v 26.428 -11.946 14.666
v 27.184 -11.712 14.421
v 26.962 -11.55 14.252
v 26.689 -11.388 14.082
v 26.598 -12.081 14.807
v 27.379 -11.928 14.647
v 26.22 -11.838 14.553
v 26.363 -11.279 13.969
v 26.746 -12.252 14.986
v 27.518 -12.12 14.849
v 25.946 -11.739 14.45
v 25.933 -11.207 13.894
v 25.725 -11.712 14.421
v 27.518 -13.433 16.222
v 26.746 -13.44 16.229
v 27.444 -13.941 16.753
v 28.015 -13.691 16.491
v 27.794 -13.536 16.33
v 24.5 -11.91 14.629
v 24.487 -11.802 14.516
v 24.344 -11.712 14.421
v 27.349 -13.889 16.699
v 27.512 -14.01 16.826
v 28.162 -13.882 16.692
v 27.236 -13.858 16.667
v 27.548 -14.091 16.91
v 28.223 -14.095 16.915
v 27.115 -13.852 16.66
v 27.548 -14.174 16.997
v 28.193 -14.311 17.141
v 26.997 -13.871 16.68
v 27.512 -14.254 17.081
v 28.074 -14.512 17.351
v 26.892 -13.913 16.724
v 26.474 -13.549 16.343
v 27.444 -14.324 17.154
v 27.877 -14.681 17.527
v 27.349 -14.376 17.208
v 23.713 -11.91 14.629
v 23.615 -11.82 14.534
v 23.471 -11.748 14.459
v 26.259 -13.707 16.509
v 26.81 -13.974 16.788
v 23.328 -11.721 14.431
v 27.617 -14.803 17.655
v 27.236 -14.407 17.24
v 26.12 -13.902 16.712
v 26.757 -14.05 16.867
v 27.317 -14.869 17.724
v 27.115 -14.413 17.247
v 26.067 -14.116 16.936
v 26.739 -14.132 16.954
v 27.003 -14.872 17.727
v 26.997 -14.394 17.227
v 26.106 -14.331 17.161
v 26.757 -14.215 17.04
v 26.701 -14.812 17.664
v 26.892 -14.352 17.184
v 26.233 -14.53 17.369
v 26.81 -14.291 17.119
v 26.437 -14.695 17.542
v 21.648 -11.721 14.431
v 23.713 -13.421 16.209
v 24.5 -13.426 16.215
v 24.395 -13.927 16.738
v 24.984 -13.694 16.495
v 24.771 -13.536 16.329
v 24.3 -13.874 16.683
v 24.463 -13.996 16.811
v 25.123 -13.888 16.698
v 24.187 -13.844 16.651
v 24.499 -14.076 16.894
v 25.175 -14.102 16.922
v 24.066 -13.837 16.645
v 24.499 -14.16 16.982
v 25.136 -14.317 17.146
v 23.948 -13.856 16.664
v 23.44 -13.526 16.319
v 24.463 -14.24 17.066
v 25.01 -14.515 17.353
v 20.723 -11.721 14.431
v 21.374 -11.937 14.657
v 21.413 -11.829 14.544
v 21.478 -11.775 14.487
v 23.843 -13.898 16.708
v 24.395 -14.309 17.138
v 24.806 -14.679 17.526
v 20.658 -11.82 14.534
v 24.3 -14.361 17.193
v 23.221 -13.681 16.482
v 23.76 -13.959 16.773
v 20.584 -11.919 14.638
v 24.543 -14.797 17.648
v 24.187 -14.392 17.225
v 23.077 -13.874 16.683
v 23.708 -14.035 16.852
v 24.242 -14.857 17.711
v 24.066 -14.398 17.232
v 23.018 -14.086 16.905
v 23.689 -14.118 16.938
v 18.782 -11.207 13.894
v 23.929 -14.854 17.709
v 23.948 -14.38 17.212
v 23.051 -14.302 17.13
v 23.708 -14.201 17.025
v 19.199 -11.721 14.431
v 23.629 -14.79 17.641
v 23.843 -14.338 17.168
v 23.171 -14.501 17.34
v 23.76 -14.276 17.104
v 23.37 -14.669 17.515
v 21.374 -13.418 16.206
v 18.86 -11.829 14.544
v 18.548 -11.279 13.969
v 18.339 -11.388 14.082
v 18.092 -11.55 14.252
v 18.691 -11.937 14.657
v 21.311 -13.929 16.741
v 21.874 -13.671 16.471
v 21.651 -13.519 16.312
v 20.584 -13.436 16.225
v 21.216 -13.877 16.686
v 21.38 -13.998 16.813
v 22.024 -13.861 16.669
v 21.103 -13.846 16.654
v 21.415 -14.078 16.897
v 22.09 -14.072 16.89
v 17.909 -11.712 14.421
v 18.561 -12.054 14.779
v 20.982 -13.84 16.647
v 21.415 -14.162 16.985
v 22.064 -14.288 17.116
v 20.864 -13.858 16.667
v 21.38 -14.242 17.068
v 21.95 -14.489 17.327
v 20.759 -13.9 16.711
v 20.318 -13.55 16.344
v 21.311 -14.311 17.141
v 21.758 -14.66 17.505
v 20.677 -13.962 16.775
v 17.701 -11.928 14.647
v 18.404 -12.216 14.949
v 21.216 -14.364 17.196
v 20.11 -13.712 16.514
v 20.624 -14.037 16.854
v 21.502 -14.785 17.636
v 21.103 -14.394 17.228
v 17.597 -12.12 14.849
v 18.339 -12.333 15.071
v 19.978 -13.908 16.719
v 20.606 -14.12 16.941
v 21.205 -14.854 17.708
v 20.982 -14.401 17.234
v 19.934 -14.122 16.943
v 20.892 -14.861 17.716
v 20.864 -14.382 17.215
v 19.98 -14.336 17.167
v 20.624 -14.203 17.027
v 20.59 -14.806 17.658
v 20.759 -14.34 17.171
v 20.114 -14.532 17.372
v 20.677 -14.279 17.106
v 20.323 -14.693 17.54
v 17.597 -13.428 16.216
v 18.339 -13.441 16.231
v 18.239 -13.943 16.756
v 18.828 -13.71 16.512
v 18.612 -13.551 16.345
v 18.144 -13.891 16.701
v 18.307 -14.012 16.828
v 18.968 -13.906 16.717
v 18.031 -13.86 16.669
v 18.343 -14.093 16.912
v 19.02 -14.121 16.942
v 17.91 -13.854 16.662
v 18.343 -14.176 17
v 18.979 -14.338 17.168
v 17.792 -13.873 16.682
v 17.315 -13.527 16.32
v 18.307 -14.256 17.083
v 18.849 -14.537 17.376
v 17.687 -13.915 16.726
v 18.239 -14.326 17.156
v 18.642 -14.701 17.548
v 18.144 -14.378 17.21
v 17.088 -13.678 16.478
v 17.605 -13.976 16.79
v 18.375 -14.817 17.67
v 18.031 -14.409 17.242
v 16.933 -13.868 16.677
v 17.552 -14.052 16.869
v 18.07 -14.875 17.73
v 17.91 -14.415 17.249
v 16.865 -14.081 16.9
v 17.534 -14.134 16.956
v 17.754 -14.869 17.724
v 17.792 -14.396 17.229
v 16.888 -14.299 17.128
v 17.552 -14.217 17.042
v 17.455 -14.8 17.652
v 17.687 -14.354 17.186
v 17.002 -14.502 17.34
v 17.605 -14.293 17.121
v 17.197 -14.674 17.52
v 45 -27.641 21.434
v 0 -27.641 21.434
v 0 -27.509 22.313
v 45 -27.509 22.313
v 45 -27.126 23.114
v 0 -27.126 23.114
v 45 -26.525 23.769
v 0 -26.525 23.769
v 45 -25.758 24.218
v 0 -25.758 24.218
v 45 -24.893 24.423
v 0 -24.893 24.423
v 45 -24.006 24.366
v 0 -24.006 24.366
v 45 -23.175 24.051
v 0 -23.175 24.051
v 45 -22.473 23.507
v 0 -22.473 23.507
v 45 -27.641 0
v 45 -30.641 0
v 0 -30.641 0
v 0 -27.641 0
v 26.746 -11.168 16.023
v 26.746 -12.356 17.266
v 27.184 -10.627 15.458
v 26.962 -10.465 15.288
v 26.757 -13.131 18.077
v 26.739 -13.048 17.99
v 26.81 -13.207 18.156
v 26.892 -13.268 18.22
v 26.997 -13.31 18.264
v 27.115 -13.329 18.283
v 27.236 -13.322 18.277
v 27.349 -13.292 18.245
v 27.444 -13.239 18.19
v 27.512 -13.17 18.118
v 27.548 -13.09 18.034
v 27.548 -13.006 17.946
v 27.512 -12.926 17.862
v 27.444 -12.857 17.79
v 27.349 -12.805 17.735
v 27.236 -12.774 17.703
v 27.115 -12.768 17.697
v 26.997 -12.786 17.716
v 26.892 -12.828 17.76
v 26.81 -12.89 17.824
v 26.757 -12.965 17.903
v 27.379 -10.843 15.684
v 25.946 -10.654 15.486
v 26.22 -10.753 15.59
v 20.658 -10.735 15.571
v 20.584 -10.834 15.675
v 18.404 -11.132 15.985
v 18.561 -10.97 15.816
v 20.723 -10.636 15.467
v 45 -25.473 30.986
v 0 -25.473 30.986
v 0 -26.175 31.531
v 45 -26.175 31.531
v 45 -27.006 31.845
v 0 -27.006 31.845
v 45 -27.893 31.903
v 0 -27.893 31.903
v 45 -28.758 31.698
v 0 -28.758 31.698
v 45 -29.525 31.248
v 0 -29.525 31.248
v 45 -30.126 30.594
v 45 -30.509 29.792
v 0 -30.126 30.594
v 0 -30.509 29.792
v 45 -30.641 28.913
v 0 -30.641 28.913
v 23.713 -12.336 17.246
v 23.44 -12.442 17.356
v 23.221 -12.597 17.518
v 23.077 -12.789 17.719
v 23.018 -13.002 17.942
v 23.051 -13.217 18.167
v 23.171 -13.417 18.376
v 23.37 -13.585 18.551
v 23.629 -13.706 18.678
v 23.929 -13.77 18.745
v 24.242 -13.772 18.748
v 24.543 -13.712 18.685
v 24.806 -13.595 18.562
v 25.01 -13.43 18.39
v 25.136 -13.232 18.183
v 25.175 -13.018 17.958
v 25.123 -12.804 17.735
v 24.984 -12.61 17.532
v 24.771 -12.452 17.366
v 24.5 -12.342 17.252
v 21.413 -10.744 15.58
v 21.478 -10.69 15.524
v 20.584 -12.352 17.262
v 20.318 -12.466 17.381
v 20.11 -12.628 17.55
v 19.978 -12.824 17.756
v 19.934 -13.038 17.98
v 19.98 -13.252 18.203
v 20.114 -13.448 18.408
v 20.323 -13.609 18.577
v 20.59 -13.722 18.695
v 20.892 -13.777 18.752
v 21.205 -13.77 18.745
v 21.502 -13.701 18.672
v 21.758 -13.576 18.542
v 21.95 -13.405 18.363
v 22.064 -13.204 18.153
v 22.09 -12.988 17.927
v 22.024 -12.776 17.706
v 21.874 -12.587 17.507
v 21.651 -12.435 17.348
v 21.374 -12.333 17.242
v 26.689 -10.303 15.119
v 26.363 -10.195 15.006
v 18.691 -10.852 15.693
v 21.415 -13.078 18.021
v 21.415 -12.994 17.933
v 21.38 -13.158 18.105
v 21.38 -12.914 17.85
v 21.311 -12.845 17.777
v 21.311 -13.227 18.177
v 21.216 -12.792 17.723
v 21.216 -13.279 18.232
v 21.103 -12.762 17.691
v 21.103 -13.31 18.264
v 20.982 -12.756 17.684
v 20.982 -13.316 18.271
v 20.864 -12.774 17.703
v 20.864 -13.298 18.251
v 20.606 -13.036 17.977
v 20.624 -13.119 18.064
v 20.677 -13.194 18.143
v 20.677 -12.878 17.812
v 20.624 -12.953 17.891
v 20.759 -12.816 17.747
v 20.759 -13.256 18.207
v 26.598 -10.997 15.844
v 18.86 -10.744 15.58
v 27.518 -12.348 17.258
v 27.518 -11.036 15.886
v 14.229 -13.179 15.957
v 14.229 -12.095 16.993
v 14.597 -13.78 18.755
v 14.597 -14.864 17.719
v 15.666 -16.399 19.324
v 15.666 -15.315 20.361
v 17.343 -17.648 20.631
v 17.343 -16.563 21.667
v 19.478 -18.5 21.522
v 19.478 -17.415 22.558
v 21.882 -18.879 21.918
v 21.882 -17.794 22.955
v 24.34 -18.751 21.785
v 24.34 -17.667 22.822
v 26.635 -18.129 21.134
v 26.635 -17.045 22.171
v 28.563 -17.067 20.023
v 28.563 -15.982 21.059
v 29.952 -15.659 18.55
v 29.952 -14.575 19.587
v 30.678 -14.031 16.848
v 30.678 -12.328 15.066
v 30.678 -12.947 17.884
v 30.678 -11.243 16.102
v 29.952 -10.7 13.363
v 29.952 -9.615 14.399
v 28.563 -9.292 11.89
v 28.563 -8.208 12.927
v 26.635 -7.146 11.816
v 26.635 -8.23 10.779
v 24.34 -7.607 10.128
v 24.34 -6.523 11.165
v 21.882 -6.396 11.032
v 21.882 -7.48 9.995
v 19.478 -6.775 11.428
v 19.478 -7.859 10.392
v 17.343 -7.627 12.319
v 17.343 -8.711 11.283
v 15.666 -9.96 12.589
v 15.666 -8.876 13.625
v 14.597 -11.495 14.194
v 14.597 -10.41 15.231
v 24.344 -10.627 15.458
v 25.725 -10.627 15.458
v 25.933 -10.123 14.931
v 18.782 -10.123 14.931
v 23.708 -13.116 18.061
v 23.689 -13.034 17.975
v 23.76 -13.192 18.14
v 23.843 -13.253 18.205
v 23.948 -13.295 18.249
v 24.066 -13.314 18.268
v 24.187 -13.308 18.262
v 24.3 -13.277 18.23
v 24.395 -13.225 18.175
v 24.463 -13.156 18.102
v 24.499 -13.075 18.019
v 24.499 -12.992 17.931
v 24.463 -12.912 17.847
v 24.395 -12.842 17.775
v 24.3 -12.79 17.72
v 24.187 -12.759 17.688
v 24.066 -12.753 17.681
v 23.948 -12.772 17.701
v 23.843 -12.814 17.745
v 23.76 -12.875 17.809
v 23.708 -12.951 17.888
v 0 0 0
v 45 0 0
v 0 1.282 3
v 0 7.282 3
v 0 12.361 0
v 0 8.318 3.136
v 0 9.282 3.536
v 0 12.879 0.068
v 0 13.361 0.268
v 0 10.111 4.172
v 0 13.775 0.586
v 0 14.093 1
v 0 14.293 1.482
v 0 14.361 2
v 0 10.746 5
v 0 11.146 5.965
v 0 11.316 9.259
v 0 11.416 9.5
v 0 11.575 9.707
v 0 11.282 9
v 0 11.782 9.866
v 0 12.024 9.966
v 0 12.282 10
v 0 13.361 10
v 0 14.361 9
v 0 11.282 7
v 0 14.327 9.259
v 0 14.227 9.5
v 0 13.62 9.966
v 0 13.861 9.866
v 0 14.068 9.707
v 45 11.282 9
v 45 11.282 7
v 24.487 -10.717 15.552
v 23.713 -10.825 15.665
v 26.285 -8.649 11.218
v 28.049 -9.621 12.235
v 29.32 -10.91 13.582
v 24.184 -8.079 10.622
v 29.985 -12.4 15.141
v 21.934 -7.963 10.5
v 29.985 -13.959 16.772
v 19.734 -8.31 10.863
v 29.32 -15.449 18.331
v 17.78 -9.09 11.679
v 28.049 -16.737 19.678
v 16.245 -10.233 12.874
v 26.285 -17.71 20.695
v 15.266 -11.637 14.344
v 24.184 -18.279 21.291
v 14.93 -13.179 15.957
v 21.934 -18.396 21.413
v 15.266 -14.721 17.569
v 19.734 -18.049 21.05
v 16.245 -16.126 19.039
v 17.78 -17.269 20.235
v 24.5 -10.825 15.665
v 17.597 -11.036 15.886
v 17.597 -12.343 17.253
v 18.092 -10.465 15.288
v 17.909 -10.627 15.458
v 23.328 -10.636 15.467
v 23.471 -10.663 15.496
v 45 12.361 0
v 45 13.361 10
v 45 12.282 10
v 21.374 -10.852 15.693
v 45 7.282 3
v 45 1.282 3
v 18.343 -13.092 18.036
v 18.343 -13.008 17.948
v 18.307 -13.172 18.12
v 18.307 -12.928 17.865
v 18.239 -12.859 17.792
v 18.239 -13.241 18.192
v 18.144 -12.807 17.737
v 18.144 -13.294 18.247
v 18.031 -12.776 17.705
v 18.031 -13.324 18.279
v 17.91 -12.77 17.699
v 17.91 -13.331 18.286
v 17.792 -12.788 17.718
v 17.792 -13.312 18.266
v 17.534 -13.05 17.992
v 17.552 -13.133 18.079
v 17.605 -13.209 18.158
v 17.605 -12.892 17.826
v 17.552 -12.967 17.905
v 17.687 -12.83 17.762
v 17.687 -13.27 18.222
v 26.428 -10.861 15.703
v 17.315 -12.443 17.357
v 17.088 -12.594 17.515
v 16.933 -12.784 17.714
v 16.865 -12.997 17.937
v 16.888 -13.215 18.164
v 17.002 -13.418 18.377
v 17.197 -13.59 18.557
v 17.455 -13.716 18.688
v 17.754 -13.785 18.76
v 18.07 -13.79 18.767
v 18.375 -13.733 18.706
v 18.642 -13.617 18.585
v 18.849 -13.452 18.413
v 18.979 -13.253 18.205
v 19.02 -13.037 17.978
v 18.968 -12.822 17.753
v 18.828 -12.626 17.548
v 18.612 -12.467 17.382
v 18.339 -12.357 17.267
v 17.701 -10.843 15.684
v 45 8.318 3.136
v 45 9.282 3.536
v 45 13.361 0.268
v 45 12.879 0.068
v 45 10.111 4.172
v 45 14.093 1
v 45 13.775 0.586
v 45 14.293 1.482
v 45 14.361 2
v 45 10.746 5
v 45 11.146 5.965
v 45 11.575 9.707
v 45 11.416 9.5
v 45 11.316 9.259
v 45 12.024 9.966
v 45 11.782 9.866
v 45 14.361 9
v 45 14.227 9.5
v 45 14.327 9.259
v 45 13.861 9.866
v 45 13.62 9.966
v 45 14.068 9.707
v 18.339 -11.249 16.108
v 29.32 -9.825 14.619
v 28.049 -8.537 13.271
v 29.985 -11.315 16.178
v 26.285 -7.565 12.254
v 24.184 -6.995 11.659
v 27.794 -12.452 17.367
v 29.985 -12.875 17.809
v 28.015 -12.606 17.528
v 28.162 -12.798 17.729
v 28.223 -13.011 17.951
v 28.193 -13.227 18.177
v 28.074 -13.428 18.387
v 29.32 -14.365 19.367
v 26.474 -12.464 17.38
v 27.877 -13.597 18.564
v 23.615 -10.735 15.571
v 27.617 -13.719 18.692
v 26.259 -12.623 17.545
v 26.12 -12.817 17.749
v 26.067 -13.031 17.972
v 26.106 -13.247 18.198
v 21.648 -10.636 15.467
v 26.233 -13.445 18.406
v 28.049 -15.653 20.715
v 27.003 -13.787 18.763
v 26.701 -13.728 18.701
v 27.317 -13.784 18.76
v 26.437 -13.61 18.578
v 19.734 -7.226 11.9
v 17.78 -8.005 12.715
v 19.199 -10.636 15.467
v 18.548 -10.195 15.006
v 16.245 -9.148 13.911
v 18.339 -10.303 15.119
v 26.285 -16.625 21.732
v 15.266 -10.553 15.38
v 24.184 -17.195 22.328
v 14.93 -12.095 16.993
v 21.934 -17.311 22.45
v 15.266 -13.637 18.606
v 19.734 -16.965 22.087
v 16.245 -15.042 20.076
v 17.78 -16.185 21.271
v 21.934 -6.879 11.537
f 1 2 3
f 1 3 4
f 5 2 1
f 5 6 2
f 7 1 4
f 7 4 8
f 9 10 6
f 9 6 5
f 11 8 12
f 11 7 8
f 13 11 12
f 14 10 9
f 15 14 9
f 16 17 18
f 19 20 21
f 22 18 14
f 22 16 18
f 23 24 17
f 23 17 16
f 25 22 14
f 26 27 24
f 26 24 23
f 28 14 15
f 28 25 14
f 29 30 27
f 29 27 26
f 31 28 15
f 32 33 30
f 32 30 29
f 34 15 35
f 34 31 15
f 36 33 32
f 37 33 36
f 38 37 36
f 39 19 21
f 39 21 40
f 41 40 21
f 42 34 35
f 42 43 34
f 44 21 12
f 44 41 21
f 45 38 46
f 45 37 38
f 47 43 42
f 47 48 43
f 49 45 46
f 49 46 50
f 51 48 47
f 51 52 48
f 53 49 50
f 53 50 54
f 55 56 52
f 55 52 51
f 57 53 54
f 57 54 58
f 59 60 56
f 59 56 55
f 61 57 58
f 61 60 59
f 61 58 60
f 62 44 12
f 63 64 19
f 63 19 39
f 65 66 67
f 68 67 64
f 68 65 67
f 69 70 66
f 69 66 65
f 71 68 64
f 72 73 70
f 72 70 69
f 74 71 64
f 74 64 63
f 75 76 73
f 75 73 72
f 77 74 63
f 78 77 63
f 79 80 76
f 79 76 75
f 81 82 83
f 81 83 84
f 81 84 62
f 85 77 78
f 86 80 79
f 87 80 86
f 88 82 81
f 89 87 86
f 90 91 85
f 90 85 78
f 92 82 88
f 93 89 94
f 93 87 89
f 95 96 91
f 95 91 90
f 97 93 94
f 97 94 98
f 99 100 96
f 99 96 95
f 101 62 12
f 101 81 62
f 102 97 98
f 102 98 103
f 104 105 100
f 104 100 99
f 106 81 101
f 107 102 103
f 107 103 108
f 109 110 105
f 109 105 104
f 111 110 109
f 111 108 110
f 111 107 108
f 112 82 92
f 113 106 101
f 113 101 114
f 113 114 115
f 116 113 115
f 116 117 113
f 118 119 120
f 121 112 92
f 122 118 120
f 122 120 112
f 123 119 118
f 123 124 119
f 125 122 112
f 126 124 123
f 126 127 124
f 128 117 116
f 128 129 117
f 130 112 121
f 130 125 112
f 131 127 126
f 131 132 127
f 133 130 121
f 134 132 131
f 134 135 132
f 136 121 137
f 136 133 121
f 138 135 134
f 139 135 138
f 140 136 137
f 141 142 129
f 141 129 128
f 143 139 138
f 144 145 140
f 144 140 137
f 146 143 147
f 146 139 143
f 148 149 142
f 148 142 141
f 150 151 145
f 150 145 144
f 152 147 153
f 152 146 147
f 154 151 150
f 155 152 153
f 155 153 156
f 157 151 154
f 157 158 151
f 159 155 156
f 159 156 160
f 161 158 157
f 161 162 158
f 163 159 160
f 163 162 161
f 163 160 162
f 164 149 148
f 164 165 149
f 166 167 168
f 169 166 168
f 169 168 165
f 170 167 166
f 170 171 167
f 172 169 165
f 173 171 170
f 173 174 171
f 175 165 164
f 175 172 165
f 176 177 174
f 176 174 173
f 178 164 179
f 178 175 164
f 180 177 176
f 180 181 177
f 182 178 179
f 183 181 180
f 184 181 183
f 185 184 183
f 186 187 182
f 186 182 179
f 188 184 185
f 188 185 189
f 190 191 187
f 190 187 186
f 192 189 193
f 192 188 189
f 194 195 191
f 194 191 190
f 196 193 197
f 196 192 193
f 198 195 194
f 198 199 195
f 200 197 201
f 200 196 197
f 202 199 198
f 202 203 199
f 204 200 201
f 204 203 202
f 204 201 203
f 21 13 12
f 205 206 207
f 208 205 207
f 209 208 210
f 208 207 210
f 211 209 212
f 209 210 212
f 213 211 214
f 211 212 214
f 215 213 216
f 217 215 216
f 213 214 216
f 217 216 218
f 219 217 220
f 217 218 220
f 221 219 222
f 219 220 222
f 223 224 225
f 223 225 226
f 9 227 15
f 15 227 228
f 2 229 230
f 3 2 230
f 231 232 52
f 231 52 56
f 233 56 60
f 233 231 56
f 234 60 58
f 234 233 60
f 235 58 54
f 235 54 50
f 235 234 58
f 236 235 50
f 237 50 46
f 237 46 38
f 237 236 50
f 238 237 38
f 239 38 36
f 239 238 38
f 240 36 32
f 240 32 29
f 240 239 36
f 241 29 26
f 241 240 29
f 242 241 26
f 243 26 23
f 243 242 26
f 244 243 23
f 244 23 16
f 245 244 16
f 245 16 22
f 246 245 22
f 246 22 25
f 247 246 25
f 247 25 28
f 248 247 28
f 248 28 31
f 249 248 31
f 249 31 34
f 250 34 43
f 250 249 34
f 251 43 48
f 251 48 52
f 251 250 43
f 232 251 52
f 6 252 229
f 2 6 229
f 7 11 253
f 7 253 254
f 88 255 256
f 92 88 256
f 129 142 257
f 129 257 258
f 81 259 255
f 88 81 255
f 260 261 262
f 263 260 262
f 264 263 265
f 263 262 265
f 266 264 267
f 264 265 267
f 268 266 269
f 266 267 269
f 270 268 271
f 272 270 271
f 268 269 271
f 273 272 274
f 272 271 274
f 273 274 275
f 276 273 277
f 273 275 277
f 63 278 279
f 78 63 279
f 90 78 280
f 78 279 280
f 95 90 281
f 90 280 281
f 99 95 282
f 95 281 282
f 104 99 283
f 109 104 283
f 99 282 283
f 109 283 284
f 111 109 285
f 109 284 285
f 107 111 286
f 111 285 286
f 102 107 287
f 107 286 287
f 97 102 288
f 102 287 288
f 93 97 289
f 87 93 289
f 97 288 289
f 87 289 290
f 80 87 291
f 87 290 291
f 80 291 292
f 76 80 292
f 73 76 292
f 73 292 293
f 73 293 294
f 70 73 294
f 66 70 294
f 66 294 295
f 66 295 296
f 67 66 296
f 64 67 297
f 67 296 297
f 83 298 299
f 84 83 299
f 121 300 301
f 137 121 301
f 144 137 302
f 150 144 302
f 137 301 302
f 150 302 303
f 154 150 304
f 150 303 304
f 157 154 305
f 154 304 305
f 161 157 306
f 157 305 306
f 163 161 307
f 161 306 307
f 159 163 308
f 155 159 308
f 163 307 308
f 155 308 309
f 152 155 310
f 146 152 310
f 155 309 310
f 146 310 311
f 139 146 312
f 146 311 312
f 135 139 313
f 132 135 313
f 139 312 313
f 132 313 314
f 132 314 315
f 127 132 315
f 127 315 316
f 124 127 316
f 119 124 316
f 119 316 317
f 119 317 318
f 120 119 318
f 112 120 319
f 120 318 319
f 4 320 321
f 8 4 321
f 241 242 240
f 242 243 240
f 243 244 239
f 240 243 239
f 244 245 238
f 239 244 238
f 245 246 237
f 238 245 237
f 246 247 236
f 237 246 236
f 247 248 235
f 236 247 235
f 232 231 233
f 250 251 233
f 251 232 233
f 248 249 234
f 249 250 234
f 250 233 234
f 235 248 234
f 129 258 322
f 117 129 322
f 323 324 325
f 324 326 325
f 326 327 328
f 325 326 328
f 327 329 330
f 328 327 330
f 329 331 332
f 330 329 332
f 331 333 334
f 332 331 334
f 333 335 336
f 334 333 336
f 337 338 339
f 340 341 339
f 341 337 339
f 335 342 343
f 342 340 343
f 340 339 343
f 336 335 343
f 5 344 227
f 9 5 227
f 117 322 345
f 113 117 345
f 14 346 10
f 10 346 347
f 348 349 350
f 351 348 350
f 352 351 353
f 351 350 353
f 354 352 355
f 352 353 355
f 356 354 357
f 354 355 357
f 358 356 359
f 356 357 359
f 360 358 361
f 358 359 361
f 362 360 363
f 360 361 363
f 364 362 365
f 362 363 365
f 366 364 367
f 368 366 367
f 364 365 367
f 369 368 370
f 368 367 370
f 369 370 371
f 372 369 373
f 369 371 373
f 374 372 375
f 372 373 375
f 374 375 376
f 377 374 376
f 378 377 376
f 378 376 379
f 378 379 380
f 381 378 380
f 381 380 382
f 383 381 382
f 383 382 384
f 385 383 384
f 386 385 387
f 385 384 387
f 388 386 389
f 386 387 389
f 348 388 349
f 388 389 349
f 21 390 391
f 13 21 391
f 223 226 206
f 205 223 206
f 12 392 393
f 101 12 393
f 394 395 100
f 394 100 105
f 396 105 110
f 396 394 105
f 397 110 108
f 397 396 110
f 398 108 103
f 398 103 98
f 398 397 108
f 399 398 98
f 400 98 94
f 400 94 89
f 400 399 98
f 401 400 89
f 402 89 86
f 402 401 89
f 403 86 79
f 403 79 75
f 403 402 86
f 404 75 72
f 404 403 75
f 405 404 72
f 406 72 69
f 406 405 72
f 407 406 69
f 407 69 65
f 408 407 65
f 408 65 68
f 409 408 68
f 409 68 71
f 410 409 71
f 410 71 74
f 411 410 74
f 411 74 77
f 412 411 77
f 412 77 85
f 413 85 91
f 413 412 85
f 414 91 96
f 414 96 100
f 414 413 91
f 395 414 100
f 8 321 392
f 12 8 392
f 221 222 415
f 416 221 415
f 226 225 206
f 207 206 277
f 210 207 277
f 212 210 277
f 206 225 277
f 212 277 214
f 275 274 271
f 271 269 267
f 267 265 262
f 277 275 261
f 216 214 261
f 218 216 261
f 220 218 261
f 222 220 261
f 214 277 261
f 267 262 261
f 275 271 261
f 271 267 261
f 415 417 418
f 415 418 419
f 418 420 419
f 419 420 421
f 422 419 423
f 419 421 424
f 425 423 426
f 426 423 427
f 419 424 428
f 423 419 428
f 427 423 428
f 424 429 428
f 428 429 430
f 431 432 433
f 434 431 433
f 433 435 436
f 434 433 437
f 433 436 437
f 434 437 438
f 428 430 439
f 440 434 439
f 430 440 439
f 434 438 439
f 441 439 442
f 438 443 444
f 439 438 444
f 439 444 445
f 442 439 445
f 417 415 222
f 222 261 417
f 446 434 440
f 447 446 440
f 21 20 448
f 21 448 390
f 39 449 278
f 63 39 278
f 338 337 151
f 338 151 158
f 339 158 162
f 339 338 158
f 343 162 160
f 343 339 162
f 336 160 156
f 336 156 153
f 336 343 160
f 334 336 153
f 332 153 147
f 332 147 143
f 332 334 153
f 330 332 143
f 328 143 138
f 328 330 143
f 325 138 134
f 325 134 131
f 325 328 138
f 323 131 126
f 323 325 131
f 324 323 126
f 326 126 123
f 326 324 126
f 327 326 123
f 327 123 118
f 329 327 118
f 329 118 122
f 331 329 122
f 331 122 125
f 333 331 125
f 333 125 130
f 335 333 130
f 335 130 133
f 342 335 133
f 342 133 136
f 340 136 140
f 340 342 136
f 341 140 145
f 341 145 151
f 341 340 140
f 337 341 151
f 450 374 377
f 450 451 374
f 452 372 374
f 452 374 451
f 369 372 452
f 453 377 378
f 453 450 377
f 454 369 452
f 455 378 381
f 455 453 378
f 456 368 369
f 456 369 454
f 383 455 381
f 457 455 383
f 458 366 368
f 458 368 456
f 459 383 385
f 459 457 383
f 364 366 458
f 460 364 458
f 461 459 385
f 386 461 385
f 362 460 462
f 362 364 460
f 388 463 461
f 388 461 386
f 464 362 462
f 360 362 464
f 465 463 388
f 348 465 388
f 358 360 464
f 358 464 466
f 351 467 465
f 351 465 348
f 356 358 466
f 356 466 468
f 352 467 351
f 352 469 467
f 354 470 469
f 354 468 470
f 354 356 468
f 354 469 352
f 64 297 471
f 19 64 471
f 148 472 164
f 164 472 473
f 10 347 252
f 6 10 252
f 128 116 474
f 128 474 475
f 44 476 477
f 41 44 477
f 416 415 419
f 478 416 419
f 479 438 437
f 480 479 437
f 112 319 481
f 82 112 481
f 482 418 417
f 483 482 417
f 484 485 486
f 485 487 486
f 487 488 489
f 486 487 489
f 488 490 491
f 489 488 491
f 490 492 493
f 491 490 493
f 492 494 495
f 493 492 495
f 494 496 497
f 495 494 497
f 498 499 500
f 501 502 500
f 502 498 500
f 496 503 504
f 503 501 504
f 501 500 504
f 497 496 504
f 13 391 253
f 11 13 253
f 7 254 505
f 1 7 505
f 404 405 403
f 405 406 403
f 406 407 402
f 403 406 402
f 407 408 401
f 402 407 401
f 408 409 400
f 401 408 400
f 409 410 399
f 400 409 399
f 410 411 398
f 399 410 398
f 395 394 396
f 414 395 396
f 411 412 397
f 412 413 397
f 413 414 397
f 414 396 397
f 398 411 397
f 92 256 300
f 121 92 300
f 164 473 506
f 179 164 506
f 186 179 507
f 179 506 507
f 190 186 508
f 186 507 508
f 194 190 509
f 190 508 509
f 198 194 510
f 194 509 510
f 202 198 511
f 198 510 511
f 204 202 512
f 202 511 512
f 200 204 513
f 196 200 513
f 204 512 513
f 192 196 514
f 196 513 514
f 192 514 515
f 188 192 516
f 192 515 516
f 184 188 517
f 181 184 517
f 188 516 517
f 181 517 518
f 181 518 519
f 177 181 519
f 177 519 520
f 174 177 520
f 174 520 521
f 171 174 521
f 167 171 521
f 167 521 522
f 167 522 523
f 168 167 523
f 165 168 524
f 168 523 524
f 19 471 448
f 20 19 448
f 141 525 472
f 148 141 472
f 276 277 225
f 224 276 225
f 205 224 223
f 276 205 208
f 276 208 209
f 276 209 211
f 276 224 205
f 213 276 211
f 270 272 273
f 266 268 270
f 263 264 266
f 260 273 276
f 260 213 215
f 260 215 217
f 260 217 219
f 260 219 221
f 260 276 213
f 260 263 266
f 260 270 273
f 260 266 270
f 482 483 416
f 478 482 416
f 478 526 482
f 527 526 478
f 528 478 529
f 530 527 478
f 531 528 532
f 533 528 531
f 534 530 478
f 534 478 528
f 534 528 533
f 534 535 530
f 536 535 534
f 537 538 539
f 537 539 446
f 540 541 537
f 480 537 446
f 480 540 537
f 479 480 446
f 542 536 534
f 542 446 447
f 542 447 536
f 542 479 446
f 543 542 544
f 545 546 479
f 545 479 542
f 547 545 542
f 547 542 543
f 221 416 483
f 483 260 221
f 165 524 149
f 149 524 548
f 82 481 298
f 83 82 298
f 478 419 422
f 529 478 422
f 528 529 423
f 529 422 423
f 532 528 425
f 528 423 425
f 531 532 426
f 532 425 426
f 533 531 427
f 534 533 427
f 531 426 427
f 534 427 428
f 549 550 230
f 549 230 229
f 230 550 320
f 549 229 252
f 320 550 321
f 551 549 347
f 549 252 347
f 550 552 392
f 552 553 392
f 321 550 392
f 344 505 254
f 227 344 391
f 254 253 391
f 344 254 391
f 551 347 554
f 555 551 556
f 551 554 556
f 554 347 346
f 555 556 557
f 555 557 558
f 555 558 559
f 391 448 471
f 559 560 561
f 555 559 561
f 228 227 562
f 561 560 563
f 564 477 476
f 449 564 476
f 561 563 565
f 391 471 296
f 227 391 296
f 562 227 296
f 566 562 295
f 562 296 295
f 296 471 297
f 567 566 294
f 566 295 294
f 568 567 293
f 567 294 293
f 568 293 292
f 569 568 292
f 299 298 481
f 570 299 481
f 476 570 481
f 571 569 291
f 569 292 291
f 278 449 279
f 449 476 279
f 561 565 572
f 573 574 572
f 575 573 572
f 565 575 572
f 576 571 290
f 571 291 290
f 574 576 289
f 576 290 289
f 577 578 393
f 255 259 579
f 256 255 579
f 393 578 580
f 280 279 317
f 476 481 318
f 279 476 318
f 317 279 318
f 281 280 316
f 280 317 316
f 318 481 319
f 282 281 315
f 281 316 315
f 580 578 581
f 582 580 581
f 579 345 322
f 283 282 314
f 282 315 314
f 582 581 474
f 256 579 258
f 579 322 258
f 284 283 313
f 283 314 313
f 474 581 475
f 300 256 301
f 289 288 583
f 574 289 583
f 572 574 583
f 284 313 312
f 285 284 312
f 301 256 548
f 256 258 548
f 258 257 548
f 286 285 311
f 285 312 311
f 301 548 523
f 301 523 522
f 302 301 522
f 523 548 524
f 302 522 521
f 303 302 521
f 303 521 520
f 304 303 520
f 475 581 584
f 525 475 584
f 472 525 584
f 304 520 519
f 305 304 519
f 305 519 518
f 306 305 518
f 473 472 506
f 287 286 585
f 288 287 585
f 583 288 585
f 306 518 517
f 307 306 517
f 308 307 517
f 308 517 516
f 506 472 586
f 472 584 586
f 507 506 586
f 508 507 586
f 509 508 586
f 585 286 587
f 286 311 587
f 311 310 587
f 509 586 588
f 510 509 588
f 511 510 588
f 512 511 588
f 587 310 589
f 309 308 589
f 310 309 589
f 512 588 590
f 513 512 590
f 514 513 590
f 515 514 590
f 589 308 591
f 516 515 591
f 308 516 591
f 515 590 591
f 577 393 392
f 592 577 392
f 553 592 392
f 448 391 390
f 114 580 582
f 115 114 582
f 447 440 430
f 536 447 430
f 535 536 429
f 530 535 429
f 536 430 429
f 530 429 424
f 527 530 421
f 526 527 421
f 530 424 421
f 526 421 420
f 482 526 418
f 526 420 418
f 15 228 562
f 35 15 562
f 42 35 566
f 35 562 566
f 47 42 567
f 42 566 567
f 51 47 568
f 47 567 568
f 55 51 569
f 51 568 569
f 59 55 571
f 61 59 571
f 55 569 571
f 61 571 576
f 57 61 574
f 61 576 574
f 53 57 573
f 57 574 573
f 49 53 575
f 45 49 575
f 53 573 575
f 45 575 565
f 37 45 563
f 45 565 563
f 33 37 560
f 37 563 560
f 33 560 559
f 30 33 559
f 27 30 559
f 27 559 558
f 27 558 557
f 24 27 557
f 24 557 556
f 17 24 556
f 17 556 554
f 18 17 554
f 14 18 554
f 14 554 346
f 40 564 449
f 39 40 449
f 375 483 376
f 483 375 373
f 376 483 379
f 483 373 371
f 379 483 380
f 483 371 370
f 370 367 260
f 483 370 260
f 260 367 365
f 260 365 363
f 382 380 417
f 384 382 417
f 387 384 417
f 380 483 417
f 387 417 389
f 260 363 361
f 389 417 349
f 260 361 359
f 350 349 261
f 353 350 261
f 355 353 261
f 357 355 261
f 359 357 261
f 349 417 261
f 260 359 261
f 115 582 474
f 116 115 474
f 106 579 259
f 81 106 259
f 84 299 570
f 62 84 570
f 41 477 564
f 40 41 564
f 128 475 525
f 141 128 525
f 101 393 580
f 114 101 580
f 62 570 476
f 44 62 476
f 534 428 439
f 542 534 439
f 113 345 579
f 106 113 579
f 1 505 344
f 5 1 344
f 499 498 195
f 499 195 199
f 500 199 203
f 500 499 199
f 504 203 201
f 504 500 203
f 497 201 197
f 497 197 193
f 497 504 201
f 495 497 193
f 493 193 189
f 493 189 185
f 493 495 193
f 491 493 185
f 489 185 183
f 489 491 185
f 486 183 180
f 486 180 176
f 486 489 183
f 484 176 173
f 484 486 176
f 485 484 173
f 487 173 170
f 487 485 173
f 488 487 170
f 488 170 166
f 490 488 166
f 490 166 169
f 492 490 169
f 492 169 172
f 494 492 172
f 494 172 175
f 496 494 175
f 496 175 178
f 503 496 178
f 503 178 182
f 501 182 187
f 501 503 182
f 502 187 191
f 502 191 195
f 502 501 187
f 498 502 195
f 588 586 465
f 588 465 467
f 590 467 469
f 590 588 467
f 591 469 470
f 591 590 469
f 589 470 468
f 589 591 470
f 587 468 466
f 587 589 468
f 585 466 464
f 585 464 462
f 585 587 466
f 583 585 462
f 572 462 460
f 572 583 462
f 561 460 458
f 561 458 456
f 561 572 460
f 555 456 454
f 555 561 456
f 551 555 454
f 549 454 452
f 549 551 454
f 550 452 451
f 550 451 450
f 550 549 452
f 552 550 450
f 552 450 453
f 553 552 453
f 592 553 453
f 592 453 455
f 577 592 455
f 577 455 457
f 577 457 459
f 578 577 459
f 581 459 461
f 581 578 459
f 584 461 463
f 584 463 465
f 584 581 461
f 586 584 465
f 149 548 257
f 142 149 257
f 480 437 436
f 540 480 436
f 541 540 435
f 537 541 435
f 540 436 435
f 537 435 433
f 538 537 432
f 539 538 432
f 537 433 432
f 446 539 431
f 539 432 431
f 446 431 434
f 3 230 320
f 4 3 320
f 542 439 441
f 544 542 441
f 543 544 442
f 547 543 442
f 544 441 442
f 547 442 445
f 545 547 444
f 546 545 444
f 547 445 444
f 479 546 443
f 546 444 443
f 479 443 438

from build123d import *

# Parameters (mm, degrees)
F1_DEPTH = 45
F2_R     = 8.270702783
F2_R_2   = 7.5699344576
F2_R_3   = 0.4069488222
F3_DEPTH = 1.5


with BuildPart() as f1:
    # F0 (on Right) → F1 (new body)
    with BuildSketch(Plane.YZ):
        with BuildLine():
            Line((-22.4725382223, 23.5068366048), (0, 0))
            Line((0, 0), (12.3609593138, 0))
            ThreePointArc((12.3609593138, 0), (13.7751728762, 0.5857864376), (14.3609593138, 2))
            Line((14.3609593138, 2), (14.3609593138, 7))
            Line((14.3609593138, 7), (14.3609593138, 9))
            ThreePointArc((14.3609593138, 9), (14.068066095, 9.7071067812), (13.3609593138, 10))
            Line((13.3609593138, 10), (12.2823521785, 10))
            ThreePointArc((12.2823521785, 10), (11.5752453973, 9.7071067812), (11.2823521785, 9))
            Line((11.2823521785, 9), (11.2823521785, 7))
            ThreePointArc((11.2823521785, 7), (10.1107793032, 4.1715728753), (7.2823521785, 3))
            Line((7.2823521785, 3), (1.2823521785, 3))
            Line((1.2823521785, 3), (-25.4725382223, 30.9862840062))
            ThreePointArc((-25.4725382223, 30.9862840062), (-28.7578385809, 31.6975803479), (-30.6410287362, 28.913206851))
            Line((-30.6410287362, 28.913206851), (-30.6410287362, 0))
            Line((-30.6410287362, 0), (-27.6410287362, 0))
            Line((-27.6410287362, 0), (-27.6410287362, 21.4337594496))
            ThreePointArc((-27.6410287362, 21.4337594496), (-25.7578385809, 24.2181329465), (-22.4725382223, 23.5068366048))
        make_face()
    extrude(amount=F1_DEPTH)

    # F2 (on face) → F3 (cut)
    with BuildSketch(Plane(origin=(0, 2.1684905138, 2.0730771552), x_dir=(-1, 0, 0), z_dir=(0, 0.7228301713, 0.6910257184))):
        with Locations((-22.5, 20.6411760892)):
            Circle(F2_R)
        with Locations((-22.5, 20.6411760892)):
            Circle(F2_R_2, mode=Mode.SUBTRACT)
        with BuildLine():
            Line((-26.7460289363, 19.2989930163), (-26.7460289363, 21.0181410771))
            ThreePointArc((-26.7460289363, 21.0181410771), (-27.1604015057, 23.0993524994), (-27.5180879991, 21.0076531943))
            Line((-27.5180879991, 21.0076531943), (-27.5180879991, 19.1088523712))
            Line((-27.5180879991, 19.1088523712), (-27.3791737854, 18.8299436122))
            Line((-27.3791737854, 18.8299436122), (-27.1837860346, 18.5172446072))
            Line((-27.1837860346, 18.5172446072), (-26.9623473287, 18.2827226818))
            Line((-26.9623473287, 18.2827226818), (-26.68880485, 18.0481951684))
            Line((-26.68880485, 18.0481951684), (-26.3631585985, 17.8918484598))
            Line((-26.3631585985, 17.8918484598), (-25.9333048016, 17.7876148373))
            Line((-25.9333048016, 17.7876148373), (-18.7821220607, 17.7876148373))
            Line((-18.7821220607, 17.7876148373), (-18.5476560146, 17.8918484598))
            Line((-18.5476560146, 17.8918484598), (-18.3392427862, 18.0481951684))
            Line((-18.3392427862, 18.0481951684), (-18.0917512625, 18.2827226818))
            Line((-18.0917512625, 18.2827226818), (-17.9093908519, 18.5172446072))
            Line((-17.9093908519, 18.5172446072), (-17.7009776235, 18.8299436122))
            Line((-17.7009776235, 18.8299436122), (-17.5967700779, 19.1088523712))
            Line((-17.5967700779, 19.1088523712), (-17.5967700779, 21.0005989226))
            ThreePointArc((-17.5967700779, 21.0005989226), (-17.9118361845, 23.10197132), (-18.3392427862, 21.0205400333))
            Line((-18.3392427862, 21.0205400333), (-18.3392427862, 19.4162540138))
            Line((-18.3392427862, 19.4162540138), (-18.4043720365, 19.2468762398))
            Line((-18.4043720365, 19.2468762398), (-18.5606833547, 19.0123524517))
            Line((-18.5606833547, 19.0123524517), (-18.6909399927, 18.8429746777))
            Line((-18.6909399927, 18.8429746777), (-18.8602767885, 18.6866223812))
            Line((-18.8602767885, 18.6866223812), (-19.1989485174, 18.5302719474))
            Line((-19.1989485174, 18.5302719474), (-20.7229703665, 18.5302719474))
            Line((-20.7229703665, 18.5302719474), (-20.6578411162, 18.6735969037))
            Line((-20.6578411162, 18.6735969037), (-20.5836875976, 18.8169161692))
            Line((-20.5836875976, 18.8169161692), (-20.5836875976, 21.0127137605))
            ThreePointArc((-20.5836875976, 21.0127137605), (-21.0493362808, 23.0811417849), (-21.3742628694, 20.9859936039))
            Line((-21.3742628694, 20.9859936039), (-21.3742628694, 18.8429746777))
            Line((-21.3742628694, 18.8429746777), (-21.4133411646, 18.6866223812))
            Line((-21.4133411646, 18.6866223812), (-21.4784704149, 18.6084471643))
            Line((-21.4784704149, 18.6084471643), (-21.647805348, 18.5302719474))
            Line((-21.647805348, 18.5302719474), (-23.3281385154, 18.5302719474))
            Line((-23.3281385154, 18.5302719474), (-23.4714224935, 18.5693614185))
            Line((-23.4714224935, 18.5693614185), (-23.6147064716, 18.6735969037))
            Line((-23.6147064716, 18.6735969037), (-23.7134122117, 18.8038833277))
            Line((-23.7134122117, 18.8038833277), (-23.7134122117, 20.990443881))
            ThreePointArc((-23.7134122117, 20.990443881), (-24.0851049871, 23.0782021511), (-24.5004631579, 20.9986907413))
            Line((-24.5004631579, 20.9986907413), (-24.5004631579, 18.8038833439))
            Line((-24.5004631579, 18.8038833439), (-24.4874376804, 18.647538498))
            Line((-24.4874376804, 18.647538498), (-24.3441537023, 18.5172446072))
            Line((-24.3441537023, 18.5172446072), (-25.7248915732, 18.5172446072))
            Line((-25.7248915732, 18.5172446072), (-25.9463302791, 18.556330353))
            Line((-25.9463302791, 18.556330353), (-26.2198727578, 18.6996497214))
            Line((-26.2198727578, 18.6996497214), (-26.4282878488, 18.8560020179))
            Line((-26.4282878488, 18.8560020179), (-26.597622782, 19.0514381975))
            Line((-26.597622782, 19.0514381975), (-26.7460289363, 19.2989930163))
        make_face()
        with Locations((-27.1457448778, 22.0204138214)):
            Circle(F2_R_3, mode=Mode.SUBTRACT)
        with Locations((-24.0964107215, 21.9992231578)):
            Circle(F2_R_3, mode=Mode.SUBTRACT)
        with Locations((-21.0128873587, 22.0027193427)):
            Circle(F2_R_3, mode=Mode.SUBTRACT)
        with Locations((-17.9408062249, 22.0233220607)):
            Circle(F2_R_3, mode=Mode.SUBTRACT)
    extrude(amount=-F3_DEPTH, mode=Mode.SUBTRACT)


solid = f1.part
